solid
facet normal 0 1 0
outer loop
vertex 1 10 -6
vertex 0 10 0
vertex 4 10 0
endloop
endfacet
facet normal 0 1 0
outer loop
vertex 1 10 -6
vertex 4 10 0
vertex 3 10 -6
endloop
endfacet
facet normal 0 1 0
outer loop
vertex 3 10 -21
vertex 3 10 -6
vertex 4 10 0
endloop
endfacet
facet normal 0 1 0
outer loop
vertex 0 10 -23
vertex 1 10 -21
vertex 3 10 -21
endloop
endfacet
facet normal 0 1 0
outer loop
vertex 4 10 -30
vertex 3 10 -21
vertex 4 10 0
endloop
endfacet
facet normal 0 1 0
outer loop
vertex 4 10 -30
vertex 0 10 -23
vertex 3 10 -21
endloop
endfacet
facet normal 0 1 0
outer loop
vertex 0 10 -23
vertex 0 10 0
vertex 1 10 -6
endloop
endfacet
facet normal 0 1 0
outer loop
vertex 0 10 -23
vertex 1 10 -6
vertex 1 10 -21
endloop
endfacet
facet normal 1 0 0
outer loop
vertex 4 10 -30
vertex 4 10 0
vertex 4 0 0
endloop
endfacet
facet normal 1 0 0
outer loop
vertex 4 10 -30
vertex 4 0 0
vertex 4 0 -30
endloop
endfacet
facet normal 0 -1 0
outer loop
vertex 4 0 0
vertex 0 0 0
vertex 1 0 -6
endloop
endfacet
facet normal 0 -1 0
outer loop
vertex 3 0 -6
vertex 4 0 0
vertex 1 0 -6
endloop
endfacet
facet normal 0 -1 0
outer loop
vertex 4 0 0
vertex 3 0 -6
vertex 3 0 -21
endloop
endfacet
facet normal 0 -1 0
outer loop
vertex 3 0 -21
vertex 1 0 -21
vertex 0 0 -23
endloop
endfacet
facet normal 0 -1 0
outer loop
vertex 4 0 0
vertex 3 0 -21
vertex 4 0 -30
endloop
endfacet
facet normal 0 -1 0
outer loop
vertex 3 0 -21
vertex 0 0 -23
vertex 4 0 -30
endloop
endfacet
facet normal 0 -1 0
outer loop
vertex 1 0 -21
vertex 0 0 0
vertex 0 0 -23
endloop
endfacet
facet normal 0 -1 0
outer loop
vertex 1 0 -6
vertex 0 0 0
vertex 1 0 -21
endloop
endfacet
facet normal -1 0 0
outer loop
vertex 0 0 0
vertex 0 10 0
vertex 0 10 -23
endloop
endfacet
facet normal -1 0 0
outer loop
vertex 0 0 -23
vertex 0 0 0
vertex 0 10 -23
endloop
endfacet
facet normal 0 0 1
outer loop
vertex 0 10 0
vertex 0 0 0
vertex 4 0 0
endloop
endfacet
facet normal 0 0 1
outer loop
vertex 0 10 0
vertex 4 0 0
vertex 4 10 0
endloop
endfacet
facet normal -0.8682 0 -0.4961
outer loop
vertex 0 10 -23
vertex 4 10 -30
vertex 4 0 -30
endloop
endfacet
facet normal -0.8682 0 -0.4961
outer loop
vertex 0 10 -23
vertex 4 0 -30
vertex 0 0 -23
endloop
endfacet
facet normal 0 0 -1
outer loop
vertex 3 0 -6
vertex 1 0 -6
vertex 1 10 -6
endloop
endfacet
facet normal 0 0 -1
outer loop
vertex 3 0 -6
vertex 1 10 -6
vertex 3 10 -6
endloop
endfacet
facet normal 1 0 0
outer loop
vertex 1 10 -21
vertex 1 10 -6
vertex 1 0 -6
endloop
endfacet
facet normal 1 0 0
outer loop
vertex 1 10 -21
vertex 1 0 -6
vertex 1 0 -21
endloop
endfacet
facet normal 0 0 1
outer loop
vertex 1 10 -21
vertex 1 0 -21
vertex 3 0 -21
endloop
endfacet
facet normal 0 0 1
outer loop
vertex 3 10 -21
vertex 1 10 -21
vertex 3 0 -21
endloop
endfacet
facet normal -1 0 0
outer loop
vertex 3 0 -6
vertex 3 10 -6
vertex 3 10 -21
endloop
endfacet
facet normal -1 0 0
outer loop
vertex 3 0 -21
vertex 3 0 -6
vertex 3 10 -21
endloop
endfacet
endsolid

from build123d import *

# Parameters (mm, degrees)
SKETCH_1_W          = 30
SKETCH_1_H          = 10
EXTRUDE_1_DEPTH     = 4
SKETCH_2_W          = 2
SKETCH_2_H          = 15
CUT_EXTRUDE_1_DEPTH = 32.874754901
CUT_EXTRUDE_2_DEPTH = 32.874754901


with BuildPart() as part:
    # Эскиз1 → Бобышка-Вытянуть1 (new body)
    with BuildSketch(Plane(origin=(0, 0, 0), x_dir=(0, 0, -1), z_dir=(1, 0, 0))):
        with Locations((15, 5)):
            Rectangle(SKETCH_1_W, SKETCH_1_H)
    extrude(amount=EXTRUDE_1_DEPTH)

    # Эскиз2 → Вырез-Вытянуть1 (cut, through all)
    with BuildSketch(Plane(origin=(0, 10, 0), x_dir=(1, 0, 0), z_dir=(0, 1, 0))):
        with Locations((2, 13.5)):
            Rectangle(SKETCH_2_W, SKETCH_2_H)
    extrude(amount=-CUT_EXTRUDE_1_DEPTH, mode=Mode.SUBTRACT)

    # Эскиз3 → Вырез-Вытянуть2 (cut, through all)
    with BuildSketch(Plane(origin=(0, 10, 0), x_dir=(1, 0, 0), z_dir=(0, 1, 0))):
        Polygon((0, 23), (0, 30), (4, 30), align=None)
    extrude(amount=-CUT_EXTRUDE_2_DEPTH, mode=Mode.SUBTRACT)


solid = part.part
